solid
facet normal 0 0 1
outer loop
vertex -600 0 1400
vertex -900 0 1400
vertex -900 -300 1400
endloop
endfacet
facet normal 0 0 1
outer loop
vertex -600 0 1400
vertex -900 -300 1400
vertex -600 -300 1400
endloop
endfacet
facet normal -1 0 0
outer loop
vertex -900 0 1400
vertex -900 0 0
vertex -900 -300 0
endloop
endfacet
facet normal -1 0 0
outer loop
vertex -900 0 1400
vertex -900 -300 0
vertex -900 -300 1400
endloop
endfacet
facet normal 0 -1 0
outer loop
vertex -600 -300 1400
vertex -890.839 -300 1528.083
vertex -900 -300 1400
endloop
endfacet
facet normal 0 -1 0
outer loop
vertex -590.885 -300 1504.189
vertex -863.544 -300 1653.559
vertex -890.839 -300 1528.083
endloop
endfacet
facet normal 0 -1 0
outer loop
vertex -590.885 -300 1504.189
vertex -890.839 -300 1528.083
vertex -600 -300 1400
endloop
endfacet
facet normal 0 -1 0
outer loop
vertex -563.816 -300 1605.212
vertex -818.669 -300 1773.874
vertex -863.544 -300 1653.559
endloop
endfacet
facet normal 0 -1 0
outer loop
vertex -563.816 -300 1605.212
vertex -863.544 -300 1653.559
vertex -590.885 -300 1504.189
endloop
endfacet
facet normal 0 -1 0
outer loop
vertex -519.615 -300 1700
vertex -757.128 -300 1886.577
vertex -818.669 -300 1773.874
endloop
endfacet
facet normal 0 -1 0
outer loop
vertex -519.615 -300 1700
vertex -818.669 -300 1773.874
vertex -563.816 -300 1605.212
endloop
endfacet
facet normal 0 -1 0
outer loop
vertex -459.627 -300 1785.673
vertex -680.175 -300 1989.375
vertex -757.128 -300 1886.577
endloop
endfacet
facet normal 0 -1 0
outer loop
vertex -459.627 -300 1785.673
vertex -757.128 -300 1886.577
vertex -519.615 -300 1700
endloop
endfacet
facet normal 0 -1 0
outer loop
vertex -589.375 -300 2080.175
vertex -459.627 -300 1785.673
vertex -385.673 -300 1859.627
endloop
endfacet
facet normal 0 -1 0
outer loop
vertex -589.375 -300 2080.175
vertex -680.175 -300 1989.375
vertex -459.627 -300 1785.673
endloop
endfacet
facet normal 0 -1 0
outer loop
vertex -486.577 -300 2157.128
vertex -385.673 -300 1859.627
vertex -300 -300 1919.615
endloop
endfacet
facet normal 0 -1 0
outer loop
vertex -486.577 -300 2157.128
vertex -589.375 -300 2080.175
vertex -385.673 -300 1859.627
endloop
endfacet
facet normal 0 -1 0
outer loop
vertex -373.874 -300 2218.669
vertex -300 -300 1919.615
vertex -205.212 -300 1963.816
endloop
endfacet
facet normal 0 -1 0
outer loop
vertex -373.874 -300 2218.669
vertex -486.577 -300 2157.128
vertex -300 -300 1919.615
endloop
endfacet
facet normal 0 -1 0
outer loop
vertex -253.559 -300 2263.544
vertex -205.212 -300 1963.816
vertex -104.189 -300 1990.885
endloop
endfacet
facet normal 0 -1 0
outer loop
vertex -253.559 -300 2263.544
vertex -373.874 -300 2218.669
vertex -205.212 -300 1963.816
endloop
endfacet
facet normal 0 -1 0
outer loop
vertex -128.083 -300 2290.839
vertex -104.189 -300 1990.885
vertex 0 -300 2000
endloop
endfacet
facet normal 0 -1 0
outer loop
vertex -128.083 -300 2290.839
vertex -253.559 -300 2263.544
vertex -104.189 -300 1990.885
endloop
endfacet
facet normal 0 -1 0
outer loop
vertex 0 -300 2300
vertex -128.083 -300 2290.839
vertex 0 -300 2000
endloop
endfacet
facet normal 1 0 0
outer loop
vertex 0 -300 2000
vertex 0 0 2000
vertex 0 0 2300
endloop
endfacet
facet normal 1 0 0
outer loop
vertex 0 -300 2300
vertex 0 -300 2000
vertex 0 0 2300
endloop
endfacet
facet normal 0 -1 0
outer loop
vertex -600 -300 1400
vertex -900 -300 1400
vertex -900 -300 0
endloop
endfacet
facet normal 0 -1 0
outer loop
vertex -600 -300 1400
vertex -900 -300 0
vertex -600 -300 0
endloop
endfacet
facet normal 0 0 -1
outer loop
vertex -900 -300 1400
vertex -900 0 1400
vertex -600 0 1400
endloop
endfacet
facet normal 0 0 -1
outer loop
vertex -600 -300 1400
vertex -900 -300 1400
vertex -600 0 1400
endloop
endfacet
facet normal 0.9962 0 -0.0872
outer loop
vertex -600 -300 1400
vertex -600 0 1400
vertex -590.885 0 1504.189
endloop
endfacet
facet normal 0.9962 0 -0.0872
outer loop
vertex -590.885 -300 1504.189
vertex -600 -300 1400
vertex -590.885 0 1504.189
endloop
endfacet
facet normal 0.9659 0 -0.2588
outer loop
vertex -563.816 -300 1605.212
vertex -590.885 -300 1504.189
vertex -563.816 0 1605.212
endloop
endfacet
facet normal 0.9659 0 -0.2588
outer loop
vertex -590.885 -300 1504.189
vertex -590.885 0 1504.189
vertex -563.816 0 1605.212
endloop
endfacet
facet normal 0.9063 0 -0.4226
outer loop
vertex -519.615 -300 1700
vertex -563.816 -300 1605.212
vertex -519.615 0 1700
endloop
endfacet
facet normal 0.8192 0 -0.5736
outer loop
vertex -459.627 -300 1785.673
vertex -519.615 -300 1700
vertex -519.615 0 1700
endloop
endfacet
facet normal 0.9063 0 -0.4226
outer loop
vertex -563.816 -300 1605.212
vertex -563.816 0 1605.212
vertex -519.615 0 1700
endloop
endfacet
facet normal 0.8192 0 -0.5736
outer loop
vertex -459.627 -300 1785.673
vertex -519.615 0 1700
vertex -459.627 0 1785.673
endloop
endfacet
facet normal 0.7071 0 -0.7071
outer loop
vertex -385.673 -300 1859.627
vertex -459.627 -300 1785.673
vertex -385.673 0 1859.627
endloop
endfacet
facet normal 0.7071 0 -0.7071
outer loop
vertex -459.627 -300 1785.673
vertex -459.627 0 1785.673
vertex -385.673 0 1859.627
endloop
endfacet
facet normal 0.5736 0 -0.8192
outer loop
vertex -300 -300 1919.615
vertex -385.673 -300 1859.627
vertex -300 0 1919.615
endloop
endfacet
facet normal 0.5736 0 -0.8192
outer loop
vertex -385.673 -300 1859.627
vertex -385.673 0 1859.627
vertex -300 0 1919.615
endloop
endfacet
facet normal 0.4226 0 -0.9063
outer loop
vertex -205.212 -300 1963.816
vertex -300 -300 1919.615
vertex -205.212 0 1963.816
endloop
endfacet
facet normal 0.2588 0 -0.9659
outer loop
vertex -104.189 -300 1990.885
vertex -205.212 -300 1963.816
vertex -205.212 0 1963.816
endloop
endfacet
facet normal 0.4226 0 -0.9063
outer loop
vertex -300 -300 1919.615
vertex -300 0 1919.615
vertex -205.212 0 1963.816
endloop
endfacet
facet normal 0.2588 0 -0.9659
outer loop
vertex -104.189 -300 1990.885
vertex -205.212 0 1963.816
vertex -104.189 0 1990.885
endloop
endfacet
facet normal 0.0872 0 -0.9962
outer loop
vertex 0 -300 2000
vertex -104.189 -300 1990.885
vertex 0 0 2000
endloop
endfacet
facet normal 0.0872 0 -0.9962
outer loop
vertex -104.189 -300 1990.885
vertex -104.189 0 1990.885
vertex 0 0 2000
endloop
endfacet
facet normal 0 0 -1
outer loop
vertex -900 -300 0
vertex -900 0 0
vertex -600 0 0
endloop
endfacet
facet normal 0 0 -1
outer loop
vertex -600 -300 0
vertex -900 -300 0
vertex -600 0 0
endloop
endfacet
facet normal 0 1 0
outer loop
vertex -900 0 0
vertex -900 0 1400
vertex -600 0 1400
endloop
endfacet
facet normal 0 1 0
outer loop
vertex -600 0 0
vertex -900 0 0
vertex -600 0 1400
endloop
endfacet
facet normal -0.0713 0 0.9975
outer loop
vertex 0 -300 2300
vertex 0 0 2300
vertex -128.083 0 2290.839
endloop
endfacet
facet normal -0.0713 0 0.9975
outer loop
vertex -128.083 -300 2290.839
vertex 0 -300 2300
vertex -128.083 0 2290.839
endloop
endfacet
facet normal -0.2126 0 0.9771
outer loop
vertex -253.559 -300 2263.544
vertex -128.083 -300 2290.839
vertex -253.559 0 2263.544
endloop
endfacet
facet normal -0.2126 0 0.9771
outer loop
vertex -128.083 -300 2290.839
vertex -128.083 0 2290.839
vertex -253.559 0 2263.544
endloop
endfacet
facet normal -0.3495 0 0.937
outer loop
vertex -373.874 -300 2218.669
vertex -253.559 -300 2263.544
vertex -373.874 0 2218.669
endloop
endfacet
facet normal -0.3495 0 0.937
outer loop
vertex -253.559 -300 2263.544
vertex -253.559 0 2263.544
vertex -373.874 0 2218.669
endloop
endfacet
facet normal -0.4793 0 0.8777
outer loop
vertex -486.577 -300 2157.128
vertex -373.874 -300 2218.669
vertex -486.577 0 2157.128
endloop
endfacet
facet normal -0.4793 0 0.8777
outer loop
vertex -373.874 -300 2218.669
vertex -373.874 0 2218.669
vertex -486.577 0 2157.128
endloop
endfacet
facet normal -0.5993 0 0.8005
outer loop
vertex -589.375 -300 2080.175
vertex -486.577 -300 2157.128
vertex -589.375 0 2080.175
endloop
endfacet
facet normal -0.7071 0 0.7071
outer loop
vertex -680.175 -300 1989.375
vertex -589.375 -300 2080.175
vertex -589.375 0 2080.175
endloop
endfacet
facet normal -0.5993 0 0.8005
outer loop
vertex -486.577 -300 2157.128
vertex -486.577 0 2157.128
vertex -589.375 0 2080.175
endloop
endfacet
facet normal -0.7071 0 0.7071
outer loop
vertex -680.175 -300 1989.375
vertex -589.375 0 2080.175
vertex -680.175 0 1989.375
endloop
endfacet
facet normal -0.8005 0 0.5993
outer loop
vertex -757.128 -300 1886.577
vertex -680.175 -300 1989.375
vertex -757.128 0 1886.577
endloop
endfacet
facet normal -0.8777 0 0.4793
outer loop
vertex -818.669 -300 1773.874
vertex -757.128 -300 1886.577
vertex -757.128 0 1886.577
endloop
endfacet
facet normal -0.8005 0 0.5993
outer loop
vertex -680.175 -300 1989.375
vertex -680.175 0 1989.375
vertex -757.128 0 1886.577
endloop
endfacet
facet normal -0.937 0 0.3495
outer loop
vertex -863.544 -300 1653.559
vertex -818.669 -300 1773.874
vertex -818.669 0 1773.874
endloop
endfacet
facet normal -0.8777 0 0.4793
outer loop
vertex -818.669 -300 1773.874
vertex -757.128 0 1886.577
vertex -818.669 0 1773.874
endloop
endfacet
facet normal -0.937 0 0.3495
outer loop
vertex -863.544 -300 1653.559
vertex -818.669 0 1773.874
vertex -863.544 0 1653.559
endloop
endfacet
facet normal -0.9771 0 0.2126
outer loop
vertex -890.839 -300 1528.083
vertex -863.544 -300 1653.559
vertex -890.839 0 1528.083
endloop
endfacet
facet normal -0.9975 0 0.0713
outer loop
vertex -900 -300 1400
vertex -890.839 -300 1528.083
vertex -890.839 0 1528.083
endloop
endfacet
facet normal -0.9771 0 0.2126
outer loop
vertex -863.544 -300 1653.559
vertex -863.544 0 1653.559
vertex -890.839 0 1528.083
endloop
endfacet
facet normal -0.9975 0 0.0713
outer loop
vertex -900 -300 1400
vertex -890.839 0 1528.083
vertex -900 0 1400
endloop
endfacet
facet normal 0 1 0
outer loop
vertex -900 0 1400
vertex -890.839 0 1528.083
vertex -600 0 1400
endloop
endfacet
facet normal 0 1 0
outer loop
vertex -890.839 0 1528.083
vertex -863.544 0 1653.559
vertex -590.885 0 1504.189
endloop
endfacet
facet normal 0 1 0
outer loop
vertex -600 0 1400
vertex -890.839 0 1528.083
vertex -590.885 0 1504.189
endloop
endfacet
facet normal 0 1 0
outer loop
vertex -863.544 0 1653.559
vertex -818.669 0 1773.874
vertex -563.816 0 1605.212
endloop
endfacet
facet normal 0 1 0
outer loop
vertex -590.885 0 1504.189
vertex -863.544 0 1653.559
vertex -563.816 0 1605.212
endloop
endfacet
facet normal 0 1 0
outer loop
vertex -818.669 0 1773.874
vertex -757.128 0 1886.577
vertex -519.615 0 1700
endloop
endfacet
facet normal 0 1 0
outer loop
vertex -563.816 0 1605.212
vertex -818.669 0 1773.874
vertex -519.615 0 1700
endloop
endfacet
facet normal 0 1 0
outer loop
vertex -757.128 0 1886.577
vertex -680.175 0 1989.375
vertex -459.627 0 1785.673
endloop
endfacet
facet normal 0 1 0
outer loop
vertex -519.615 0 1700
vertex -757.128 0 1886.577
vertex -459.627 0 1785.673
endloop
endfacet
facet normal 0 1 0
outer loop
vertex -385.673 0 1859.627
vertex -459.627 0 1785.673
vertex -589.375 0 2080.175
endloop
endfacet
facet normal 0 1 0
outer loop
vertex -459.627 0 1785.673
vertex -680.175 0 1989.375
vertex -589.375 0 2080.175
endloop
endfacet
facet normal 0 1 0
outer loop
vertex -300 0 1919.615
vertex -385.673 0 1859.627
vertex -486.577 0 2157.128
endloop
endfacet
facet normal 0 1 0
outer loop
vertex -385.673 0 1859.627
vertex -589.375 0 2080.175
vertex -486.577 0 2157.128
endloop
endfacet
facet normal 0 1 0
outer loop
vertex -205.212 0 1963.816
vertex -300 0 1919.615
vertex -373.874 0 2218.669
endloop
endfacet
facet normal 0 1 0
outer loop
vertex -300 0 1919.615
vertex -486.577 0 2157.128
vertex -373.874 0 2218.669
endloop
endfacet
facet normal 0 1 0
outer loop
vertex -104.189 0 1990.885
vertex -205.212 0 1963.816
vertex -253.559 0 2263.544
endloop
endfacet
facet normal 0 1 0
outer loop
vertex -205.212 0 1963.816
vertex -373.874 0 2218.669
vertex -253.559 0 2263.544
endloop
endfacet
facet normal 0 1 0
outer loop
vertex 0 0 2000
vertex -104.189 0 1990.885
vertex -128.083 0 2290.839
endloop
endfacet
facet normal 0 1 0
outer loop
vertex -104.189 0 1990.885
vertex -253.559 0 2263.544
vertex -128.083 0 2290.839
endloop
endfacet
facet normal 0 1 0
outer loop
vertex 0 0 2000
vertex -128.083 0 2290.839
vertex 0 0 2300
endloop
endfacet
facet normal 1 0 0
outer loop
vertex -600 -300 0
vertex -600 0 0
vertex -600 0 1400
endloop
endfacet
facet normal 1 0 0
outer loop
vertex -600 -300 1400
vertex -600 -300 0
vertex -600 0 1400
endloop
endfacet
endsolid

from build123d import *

# Parameters (mm, degrees)
F0_W     = 300
F0_H     = 1400
F1_DEPTH = 300
F2_DEPTH = 300


with BuildPart() as f1:
    # F0 (on Front) → F1 (new body)
    with BuildSketch(Plane.XZ):
        with Locations((-750, 700)):
            Rectangle(F0_W, F0_H)
    extrude(amount=F1_DEPTH)


with BuildPart() as f2:
    # F0 (on Front) → F2 (new body)
    with BuildSketch(Plane.XZ):
        with BuildLine():
            Line((-900, 1400), (-600, 1400))
            ThreePointArc((-600, 1400), (-424.264069, 1824.264069), (0, 2000))
            Line((0, 2000), (0, 2300))
            ThreePointArc((0, 2300), (-636.396103, 2036.396103), (-900, 1400))
        make_face()
    extrude(amount=F2_DEPTH)


solid = Compound([f1.part, f2.part])
